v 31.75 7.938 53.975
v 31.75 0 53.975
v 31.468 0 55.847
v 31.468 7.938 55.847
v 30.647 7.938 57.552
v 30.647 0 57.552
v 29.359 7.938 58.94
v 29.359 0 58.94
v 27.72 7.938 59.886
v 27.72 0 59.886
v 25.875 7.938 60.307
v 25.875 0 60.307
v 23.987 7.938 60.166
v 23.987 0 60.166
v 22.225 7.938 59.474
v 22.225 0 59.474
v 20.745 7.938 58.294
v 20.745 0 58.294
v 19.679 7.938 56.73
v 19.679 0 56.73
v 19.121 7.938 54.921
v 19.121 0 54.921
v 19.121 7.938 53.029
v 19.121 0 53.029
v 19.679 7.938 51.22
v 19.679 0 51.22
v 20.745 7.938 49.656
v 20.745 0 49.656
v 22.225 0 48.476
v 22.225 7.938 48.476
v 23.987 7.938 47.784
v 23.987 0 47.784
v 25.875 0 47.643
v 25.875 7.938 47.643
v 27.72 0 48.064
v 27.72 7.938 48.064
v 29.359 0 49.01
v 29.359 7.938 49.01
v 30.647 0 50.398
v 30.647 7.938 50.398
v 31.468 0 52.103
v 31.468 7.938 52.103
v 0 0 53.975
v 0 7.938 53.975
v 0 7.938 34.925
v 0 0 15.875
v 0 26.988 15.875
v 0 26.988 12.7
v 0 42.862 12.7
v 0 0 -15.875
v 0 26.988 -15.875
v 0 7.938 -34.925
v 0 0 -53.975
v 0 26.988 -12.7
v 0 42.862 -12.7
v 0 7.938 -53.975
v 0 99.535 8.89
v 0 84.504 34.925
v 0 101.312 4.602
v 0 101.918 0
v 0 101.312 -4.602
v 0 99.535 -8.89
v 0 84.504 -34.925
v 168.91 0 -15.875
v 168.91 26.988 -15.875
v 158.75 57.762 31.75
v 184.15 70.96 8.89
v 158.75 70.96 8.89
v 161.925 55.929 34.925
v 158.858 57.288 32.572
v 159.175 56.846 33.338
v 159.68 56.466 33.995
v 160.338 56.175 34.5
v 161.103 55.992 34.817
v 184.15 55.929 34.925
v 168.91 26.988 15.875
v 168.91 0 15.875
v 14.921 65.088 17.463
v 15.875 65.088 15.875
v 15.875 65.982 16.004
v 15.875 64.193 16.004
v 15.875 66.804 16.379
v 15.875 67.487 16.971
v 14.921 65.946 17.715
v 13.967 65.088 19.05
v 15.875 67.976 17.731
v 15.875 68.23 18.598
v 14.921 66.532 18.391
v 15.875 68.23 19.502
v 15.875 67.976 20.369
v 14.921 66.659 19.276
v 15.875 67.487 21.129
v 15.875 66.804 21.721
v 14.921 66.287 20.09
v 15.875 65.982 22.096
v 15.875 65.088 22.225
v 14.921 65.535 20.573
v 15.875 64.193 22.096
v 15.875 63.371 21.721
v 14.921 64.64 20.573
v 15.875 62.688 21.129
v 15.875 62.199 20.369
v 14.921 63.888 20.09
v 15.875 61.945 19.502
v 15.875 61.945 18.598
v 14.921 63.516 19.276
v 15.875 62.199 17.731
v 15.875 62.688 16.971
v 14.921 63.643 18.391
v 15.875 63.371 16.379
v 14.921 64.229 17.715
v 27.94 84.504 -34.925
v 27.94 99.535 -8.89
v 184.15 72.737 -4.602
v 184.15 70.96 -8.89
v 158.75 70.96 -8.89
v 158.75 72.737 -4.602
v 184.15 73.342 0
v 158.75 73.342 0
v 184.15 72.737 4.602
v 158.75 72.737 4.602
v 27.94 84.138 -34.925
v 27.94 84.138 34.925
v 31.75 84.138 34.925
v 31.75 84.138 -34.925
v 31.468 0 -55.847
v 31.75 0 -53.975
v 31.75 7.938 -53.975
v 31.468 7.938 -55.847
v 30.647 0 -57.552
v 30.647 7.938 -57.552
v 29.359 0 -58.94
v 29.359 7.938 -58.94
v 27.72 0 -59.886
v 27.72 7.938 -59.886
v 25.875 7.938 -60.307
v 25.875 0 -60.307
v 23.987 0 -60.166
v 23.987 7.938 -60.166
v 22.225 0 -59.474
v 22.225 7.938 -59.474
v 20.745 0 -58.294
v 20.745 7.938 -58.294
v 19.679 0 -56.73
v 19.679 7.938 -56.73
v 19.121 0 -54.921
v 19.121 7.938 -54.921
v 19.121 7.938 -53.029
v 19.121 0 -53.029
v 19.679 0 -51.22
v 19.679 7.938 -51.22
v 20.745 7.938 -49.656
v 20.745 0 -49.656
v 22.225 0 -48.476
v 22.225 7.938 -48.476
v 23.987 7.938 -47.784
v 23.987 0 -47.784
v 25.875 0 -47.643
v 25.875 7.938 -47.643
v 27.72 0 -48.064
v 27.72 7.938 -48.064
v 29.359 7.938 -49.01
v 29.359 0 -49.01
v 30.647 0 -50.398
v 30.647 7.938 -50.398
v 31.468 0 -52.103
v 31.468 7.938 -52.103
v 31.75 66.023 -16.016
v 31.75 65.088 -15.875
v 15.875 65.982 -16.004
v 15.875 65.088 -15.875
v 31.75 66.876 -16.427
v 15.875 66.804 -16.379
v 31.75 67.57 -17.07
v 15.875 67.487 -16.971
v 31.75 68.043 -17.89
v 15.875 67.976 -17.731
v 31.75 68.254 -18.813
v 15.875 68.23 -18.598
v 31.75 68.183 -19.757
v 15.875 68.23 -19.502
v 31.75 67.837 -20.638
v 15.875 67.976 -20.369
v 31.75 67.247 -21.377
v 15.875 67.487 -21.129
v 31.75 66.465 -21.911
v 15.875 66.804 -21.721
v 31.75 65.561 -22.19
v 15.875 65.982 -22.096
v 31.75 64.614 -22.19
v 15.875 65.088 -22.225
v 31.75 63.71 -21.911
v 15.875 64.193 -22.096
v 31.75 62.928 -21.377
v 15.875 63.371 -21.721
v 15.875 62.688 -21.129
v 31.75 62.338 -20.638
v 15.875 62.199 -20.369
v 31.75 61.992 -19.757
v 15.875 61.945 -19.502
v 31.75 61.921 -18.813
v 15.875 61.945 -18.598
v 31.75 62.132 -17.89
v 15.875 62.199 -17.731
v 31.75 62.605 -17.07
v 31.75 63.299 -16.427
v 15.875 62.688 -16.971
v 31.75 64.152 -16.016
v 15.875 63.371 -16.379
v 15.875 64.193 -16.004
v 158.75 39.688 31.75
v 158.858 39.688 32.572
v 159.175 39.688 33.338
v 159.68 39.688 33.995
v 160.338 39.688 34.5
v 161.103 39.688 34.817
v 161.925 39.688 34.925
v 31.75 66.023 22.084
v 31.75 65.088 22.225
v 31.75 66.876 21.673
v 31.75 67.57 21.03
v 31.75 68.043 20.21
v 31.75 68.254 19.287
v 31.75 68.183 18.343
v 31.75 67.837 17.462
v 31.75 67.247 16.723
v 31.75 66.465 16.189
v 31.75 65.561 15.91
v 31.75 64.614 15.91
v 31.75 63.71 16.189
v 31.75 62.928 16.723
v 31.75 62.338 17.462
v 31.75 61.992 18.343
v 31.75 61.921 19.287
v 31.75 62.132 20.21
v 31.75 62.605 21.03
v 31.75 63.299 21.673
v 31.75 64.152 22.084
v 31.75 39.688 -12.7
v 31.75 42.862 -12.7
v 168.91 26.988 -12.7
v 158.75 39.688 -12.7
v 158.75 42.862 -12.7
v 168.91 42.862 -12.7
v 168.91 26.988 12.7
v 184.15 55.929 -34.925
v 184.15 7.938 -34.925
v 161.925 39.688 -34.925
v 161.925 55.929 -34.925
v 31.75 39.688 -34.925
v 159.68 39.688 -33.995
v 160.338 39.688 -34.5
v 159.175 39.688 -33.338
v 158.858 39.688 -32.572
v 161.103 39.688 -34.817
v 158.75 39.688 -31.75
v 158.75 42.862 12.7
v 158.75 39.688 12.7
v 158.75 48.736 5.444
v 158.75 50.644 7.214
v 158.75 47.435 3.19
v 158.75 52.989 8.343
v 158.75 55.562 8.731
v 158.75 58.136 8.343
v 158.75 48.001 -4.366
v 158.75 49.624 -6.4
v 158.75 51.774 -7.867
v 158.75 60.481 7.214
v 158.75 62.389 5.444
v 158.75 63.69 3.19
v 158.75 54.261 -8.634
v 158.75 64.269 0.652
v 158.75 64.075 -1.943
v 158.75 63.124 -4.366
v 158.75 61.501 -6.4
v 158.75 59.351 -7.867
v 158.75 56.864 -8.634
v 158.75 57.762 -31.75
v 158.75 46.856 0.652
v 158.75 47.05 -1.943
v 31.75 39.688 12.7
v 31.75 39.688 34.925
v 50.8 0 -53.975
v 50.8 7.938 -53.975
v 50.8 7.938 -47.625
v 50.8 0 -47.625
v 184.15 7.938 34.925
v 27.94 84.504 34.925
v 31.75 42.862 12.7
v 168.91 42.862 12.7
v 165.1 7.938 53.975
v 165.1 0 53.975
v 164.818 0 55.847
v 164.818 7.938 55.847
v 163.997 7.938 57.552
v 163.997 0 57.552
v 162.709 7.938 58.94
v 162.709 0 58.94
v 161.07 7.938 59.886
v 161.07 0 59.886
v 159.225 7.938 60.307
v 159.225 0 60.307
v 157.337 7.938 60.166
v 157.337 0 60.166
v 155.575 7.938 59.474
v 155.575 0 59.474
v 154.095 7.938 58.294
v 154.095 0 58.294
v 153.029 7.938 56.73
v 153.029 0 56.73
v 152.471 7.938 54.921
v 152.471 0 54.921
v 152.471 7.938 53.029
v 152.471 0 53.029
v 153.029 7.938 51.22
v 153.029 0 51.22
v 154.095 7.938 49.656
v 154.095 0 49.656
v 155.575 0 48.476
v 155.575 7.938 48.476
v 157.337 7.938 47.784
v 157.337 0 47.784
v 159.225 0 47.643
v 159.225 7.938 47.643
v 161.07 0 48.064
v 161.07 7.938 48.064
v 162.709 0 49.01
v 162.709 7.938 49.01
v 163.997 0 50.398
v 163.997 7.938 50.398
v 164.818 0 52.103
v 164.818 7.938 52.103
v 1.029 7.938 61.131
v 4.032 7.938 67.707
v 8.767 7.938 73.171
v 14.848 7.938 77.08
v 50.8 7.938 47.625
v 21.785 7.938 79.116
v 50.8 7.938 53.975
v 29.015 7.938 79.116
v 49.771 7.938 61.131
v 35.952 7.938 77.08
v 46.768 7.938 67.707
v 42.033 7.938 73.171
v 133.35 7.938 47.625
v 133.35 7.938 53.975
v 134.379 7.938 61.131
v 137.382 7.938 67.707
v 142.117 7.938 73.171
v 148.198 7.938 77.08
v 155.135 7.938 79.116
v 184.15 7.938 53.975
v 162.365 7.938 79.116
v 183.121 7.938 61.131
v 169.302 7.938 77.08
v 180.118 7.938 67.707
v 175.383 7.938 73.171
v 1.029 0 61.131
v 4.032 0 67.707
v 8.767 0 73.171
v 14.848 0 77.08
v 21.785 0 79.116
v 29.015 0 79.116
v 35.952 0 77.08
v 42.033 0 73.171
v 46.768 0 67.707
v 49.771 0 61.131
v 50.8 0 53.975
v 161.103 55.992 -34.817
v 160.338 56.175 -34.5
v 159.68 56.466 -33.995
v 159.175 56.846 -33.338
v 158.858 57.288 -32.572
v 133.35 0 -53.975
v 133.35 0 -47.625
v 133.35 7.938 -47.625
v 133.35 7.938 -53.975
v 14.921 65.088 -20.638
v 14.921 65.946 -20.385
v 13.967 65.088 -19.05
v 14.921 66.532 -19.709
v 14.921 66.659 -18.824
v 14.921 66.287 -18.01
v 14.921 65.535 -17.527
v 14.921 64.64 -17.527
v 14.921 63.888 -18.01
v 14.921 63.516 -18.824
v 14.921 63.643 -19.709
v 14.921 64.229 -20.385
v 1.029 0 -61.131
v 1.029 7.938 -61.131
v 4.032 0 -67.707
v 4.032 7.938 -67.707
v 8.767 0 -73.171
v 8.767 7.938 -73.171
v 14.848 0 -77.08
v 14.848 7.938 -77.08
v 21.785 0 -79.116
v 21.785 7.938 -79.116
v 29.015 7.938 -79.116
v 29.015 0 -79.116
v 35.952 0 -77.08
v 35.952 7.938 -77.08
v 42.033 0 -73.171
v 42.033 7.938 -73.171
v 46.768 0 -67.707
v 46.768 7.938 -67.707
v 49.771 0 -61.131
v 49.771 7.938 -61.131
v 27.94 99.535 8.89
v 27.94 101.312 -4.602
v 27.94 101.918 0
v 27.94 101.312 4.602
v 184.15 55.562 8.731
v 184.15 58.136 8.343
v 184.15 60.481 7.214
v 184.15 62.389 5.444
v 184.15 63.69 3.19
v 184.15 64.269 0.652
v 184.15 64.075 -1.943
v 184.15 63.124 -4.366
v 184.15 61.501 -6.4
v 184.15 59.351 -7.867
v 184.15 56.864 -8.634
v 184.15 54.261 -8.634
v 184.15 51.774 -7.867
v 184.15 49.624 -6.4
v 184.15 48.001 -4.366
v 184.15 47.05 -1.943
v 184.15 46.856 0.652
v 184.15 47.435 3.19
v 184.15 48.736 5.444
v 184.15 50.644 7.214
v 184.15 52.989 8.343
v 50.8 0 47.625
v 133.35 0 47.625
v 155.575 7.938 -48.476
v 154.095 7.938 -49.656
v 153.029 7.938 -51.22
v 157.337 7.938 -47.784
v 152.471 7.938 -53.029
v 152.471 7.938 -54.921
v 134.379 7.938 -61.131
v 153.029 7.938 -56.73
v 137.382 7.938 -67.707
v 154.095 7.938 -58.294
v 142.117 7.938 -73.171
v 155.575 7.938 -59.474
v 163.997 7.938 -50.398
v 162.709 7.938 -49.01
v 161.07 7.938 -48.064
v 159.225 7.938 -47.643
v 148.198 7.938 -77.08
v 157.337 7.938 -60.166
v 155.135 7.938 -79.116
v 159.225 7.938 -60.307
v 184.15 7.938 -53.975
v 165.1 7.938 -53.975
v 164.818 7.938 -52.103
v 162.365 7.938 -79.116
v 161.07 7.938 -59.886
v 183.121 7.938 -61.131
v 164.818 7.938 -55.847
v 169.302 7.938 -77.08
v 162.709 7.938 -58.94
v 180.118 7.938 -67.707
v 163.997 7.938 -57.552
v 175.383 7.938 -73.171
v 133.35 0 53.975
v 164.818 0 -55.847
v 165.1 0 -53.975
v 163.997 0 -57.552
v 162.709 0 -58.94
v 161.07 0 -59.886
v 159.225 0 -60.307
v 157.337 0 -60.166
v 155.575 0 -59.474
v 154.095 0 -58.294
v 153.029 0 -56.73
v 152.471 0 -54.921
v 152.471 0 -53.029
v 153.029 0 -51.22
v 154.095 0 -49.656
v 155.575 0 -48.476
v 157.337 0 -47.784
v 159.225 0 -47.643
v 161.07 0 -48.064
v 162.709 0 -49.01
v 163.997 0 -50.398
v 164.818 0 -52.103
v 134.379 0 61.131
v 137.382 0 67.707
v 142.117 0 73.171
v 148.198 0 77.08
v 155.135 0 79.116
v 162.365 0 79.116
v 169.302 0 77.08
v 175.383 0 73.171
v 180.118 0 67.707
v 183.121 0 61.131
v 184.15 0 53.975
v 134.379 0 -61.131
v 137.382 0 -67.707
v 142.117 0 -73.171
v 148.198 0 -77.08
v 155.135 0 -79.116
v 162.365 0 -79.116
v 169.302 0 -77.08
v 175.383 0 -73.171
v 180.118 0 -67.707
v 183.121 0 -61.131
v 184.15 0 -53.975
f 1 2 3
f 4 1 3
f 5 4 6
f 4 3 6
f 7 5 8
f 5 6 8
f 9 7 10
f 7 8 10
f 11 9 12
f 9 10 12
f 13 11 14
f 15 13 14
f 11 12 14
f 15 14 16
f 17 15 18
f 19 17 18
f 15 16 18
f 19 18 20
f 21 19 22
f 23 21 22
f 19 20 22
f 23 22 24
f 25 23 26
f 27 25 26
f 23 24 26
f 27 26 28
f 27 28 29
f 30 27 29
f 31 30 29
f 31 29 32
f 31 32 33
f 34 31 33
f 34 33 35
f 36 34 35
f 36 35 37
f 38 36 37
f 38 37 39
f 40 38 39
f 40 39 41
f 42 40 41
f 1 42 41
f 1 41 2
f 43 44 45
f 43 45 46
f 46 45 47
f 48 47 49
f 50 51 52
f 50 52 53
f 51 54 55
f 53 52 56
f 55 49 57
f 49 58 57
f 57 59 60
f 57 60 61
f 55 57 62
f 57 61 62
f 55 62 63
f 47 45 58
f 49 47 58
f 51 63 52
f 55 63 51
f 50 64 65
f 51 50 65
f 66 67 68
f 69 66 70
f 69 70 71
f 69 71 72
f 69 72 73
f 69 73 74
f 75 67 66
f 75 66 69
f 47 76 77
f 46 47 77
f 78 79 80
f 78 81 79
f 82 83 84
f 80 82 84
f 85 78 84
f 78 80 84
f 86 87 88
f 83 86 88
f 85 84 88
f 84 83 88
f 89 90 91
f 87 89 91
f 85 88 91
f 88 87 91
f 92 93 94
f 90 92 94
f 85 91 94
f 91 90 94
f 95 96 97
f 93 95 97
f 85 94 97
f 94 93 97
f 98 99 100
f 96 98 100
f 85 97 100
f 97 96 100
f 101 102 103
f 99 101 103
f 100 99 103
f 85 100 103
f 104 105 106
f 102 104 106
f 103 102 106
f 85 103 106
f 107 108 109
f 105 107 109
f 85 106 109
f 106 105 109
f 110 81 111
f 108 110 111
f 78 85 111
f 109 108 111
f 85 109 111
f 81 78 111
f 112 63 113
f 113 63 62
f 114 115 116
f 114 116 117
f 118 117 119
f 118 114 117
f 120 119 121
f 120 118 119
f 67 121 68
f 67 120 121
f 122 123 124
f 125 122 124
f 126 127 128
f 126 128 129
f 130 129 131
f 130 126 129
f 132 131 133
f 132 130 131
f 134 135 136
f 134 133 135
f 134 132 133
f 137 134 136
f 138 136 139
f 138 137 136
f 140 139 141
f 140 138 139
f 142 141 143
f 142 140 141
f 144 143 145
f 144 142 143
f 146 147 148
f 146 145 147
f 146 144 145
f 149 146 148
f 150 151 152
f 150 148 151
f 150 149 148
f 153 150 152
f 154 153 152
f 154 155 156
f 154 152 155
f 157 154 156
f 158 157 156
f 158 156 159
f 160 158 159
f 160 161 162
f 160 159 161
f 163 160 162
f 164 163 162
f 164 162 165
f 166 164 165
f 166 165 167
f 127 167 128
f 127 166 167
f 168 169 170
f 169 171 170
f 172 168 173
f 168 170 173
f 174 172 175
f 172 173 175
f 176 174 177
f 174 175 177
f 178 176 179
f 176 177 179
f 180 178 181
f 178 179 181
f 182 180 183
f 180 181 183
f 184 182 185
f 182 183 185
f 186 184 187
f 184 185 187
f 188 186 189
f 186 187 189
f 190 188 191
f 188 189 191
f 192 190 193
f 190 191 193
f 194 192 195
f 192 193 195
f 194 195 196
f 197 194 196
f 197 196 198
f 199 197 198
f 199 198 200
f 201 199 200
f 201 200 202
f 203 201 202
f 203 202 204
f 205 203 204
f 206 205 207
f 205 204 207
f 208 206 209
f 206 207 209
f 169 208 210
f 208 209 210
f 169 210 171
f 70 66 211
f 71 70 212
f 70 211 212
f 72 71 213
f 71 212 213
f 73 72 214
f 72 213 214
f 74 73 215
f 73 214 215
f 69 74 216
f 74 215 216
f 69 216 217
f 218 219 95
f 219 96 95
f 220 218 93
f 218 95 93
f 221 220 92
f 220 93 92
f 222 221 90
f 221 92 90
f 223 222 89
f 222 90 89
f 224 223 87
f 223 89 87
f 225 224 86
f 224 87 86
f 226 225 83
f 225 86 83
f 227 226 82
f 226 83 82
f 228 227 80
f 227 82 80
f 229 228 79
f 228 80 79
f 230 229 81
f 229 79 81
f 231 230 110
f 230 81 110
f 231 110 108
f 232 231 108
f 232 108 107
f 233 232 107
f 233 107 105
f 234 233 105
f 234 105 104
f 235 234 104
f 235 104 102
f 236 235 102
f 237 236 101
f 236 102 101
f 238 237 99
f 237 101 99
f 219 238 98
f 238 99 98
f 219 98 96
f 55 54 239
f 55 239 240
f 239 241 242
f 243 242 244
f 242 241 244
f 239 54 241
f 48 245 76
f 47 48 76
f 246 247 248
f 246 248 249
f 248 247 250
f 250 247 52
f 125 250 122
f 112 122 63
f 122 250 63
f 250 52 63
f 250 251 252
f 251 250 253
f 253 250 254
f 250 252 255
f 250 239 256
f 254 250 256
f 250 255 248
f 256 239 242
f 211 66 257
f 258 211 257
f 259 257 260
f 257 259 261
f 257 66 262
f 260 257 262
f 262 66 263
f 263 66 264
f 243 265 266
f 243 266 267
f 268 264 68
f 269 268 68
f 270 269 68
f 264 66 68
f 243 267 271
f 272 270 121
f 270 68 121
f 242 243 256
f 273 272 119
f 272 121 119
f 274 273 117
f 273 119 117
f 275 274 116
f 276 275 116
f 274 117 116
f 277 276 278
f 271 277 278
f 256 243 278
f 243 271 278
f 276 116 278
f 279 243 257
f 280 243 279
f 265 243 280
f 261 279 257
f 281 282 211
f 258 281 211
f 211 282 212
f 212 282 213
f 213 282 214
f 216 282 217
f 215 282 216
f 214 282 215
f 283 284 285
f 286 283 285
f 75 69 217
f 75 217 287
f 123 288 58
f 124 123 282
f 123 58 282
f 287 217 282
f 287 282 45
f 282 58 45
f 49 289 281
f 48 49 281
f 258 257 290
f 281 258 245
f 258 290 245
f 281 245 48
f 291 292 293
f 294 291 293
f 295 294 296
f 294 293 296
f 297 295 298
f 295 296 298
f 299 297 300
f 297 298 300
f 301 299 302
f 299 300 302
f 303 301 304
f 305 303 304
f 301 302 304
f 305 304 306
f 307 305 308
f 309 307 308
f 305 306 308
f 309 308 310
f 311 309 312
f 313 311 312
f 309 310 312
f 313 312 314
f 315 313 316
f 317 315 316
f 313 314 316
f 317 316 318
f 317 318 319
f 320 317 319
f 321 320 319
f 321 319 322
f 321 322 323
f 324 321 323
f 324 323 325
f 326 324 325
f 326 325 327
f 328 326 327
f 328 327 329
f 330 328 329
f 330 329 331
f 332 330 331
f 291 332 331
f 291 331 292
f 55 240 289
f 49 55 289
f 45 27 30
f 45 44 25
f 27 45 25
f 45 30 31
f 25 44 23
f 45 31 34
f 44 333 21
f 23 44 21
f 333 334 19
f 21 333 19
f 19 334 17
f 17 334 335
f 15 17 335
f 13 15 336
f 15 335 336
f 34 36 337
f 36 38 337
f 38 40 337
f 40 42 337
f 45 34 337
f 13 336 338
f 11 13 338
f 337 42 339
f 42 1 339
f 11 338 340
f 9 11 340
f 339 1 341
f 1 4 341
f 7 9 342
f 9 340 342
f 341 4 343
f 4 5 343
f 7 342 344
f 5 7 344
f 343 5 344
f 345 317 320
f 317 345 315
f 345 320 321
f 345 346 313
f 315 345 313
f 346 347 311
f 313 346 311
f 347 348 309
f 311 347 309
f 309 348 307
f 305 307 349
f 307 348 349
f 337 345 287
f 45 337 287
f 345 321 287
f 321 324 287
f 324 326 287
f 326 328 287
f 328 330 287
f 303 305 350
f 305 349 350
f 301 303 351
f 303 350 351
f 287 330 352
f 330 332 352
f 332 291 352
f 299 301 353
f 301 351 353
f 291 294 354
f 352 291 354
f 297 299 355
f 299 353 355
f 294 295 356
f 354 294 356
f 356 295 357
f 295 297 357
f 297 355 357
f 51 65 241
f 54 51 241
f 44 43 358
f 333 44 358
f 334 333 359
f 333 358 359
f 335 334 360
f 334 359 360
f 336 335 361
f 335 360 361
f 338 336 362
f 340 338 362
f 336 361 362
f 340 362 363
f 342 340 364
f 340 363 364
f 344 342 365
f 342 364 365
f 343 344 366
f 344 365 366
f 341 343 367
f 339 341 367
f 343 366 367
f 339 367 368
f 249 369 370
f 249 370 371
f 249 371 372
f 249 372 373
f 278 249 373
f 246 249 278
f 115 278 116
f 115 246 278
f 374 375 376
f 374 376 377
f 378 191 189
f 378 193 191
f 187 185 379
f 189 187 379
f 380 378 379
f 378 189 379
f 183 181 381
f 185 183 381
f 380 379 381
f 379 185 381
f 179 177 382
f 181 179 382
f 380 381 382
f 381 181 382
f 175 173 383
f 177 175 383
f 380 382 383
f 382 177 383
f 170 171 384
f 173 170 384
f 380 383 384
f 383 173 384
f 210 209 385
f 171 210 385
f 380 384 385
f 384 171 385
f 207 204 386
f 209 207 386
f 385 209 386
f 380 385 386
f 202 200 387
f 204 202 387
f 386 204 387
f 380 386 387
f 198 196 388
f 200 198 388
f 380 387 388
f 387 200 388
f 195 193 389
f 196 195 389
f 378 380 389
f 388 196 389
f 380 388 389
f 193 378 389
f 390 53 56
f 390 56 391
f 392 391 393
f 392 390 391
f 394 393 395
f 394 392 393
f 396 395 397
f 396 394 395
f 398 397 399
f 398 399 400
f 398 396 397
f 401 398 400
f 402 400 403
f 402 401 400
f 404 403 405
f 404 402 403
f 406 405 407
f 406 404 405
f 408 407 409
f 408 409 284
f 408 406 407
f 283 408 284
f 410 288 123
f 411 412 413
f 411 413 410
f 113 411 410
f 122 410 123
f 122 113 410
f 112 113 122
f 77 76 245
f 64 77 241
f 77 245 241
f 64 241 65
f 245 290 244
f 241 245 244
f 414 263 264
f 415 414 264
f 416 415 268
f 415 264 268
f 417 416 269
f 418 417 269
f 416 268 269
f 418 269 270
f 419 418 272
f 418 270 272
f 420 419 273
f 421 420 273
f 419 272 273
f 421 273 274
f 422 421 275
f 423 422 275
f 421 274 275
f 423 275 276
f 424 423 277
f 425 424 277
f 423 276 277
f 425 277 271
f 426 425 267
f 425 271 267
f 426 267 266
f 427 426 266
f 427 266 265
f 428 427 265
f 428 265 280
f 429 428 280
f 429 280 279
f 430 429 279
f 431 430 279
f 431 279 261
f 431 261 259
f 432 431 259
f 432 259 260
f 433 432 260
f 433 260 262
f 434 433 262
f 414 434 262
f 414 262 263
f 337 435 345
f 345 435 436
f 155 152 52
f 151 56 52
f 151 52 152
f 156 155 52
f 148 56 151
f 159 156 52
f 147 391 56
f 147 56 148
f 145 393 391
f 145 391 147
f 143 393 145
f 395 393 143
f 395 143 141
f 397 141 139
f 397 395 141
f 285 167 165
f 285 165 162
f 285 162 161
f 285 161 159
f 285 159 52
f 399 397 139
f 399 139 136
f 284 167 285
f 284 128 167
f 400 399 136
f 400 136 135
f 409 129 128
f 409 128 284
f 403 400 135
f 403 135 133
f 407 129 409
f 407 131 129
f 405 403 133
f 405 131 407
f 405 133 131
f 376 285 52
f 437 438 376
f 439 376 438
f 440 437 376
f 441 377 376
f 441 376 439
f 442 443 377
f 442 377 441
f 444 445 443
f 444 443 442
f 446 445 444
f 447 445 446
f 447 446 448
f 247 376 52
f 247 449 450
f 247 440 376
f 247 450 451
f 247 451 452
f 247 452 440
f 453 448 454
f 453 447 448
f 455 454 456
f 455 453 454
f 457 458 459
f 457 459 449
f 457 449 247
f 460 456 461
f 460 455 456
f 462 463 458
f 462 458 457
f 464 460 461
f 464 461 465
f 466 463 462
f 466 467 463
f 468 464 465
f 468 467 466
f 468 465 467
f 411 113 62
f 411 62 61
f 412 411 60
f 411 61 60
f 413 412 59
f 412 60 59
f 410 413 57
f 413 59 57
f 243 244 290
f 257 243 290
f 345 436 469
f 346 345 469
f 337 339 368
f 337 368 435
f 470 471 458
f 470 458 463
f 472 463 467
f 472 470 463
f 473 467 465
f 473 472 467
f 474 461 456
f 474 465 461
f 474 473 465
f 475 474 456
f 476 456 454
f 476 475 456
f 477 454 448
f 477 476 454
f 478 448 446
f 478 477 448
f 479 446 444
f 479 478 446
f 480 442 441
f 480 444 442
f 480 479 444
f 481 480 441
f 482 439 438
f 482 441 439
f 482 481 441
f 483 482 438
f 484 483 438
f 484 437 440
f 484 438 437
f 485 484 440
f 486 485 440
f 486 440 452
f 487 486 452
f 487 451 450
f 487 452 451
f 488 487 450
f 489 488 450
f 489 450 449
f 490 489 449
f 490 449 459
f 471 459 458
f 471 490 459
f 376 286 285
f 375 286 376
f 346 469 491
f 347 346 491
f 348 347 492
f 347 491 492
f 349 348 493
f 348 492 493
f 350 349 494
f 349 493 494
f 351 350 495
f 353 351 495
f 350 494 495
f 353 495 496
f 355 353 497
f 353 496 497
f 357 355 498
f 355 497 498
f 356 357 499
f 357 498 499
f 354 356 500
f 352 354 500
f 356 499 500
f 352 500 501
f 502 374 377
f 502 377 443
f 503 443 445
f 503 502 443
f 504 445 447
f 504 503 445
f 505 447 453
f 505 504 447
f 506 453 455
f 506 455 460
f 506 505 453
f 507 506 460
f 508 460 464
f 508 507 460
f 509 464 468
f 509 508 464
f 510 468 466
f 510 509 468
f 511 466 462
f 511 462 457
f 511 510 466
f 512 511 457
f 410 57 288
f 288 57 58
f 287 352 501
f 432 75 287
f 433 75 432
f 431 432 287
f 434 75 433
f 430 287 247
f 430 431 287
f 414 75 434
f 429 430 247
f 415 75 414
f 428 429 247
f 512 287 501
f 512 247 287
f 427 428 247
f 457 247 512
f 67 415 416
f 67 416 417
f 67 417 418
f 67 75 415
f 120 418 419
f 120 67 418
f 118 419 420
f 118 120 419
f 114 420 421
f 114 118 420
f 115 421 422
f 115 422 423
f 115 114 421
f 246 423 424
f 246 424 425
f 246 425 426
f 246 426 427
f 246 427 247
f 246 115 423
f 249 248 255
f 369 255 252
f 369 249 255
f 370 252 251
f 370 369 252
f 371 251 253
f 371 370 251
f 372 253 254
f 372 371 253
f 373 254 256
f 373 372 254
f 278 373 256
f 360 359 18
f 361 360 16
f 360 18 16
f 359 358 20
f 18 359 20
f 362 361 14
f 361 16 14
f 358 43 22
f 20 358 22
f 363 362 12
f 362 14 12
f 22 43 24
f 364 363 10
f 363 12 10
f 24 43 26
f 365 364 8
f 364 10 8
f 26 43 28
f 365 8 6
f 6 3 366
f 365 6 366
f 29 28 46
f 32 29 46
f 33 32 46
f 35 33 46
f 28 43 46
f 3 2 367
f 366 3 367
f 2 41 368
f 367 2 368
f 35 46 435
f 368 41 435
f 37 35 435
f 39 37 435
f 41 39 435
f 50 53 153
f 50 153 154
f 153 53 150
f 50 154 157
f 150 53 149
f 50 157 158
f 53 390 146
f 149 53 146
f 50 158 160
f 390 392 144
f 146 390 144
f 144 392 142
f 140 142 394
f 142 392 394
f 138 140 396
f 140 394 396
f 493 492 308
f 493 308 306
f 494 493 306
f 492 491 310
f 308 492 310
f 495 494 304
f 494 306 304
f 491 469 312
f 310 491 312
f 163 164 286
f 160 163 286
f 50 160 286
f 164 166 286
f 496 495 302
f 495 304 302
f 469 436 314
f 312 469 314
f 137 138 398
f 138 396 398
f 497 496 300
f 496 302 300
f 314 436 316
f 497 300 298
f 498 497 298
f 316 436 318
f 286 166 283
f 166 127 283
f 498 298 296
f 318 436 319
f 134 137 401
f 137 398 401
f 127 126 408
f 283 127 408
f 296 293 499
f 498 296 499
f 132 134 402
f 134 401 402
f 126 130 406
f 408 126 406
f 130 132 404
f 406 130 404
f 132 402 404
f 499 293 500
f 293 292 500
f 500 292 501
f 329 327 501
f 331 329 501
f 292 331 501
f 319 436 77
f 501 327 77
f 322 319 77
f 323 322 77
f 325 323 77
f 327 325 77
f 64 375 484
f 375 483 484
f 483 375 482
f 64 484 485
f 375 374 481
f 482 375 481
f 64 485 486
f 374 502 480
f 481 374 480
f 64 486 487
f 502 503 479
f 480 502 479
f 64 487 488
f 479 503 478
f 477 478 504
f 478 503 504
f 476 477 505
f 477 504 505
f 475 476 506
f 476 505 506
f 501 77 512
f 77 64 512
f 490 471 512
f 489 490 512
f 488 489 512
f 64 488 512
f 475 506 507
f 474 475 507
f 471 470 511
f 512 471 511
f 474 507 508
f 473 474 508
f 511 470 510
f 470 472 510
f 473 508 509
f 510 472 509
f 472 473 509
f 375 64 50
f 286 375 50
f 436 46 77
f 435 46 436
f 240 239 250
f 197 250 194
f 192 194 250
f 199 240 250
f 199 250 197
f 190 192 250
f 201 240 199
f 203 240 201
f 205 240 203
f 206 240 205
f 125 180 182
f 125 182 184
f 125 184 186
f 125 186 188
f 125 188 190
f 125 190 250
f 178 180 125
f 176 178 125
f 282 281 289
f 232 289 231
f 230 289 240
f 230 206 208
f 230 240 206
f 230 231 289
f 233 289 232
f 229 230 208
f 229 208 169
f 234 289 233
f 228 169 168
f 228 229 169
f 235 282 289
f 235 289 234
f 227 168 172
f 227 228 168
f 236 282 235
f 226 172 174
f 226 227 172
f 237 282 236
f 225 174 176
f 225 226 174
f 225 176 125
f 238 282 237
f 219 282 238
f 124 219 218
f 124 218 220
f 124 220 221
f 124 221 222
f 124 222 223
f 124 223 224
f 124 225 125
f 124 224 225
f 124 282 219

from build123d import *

# Parameters (mm, degrees)
SKETCH1_W                           = 184.15
SKETCH1_H                           = 39.6875
EXTRUDE1_DEPTH                      = 34.925
SKETCH2_W                           = 31.75
SKETCH2_H                           = 44.45
EXTRUDE2_DEPTH                      = 69.85
EXTRUDE3_DEPTH                      = 25.4
CUT_EXTRUDE1_START                  = -15.24
CUT_EXTRUDE1_DEPTH                  = 169.91
EXTRUDE4_DEPTH                      = 7.9375
EXTRUDE5_DEPTH                      = 7.9375
SKETCH17_W                          = 82.55
SKETCH17_H                          = 12.7
EXTRUDE7_DEPTH                      = 7.9375
F_1_2_0_5_DIAMETER_HOLE1_D          = 12.7
EXTRUDE6_DEPTH                      = 27.94
F_1_4_0_25_DIAMETER_HOLE2_D         = 6.35
F_1_4_0_25_DIAMETER_HOLE2_DEPTH     = 15.875
F_1_4_0_25_DIAMETER_HOLE2_TIP       = 1.907732465
F_11_16_0_6875_DIAMETER_HOLE1_D     = 17.4625
F_11_16_0_6875_DIAMETER_HOLE1_DEPTH = 25.4
FILLET15_R                          = 3.175


with BuildPart() as part:
    # Sketch1 → Extrude1 (new body, symmetric)
    with BuildSketch(Plane.XY):
        with Locations((92.075, 19.84375)):
            Rectangle(SKETCH1_W, SKETCH1_H)
    extrude(amount=EXTRUDE1_DEPTH, both=True)

    # Sketch2 → Extrude2 (add)
    with BuildSketch(Plane.XY.offset(34.925)):
        with Locations((15.875, 61.9125)):
            Rectangle(SKETCH2_W, SKETCH2_H)
    extrude(amount=-EXTRUDE2_DEPTH)

    # Sketch3 → Extrude3 (add)
    with BuildSketch(Plane(origin=(184.15, 0, 0), x_dir=(0, 0, -1), z_dir=(1, 0, 0))):
        with BuildLine():
            Line((-34.925, 39.6875), (34.925, 39.6875))
            Line((34.925, 39.6875), (34.925, 55.929117421))
            Line((34.925, 55.929117421), (8.89, 70.960431679))
            ThreePointArc((8.89, 70.960431679), (0, 73.3425), (-8.89, 70.960431679))
            Line((-8.89, 70.960431679), (-34.925, 55.929117421))
            Line((-34.925, 55.929117421), (-34.925, 39.6875))
        make_face()
    extrude(amount=-EXTRUDE3_DEPTH)

    # Sketch4 → Cut-Extrude1 (cut, through all)
    with BuildSketch(Plane(origin=(184.15, 0, 0), x_dir=(0, 0, -1), z_dir=(1, 0, 0)).offset(CUT_EXTRUDE1_START)):
        Polygon((-15.875, 0), (15.875, 0), (15.875, 26.9875), (12.7, 26.9875), (12.7, 42.8625), (-12.7, 42.8625), (-12.7, 26.9875), (-15.875, 26.9875), align=None)
    extrude(amount=-CUT_EXTRUDE1_DEPTH, mode=Mode.SUBTRACT)

    # Sketch5 → Extrude4 (add)
    with BuildSketch(Plane.XZ):
        with BuildLine():
            Line((50.8, 53.975), (50.8, 34.925))
            Line((50.8, 34.925), (0, 34.925))
            Line((0, 34.925), (0, 53.975))
            ThreePointArc((0, 53.975), (25.4, 79.375), (50.8, 53.975))
        make_face()
    extrude4 = extrude(amount=-EXTRUDE4_DEPTH)

    # Sketch6 → Extrude5 (add)
    with BuildSketch(Plane.XZ):
        with BuildLine():
            Line((184.15, 34.925), (133.35, 34.925))
            Line((133.35, 34.925), (133.35, 53.975))
            ThreePointArc((133.35, 53.975), (158.75, 79.375), (184.15, 53.975))
            Line((184.15, 53.975), (184.15, 34.925))
        make_face()
    extrude5 = extrude(amount=-EXTRUDE5_DEPTH)

    # Sketch17 → Extrude7 (add)
    with BuildSketch(Plane.XZ):
        with Locations((92.075, 41.275)):
            Rectangle(SKETCH17_W, SKETCH17_H)
    extrude7 = extrude(amount=-EXTRUDE7_DEPTH)

    # 1/2 (0.5) Diameter Hole1 (through all)
    with Locations(Plane(origin=(0, 7.9375, 0), x_dir=(-1, 0, 0), z_dir=(0, 1, 0))):
        with Locations((-25.4, 53.975), (-158.75, 53.975)):
            f_1_2_0_5_diameter_hole1 = Hole(F_1_2_0_5_DIAMETER_HOLE1_D / 2)

    # Mirror1: Extrude4, Extrude5, Extrude7, 1/2 (0.5) Diameter Hole1 across plane
    add(extrude4.mirror(Plane.XY))
    add(extrude5.mirror(Plane.XY))
    add(extrude7.mirror(Plane.XY))
    add(f_1_2_0_5_diameter_hole1.mirror(Plane.XY), mode=Mode.SUBTRACT)

    # Sketch16 → Extrude6 (add)
    with BuildSketch(Plane(origin=(0, 0, 0), x_dir=(0, 0, -1), z_dir=(1, 0, 0))):
        with BuildLine():
            Line((-34.925, 84.1375), (34.925, 84.1375))
            Line((34.925, 84.1375), (34.925, 84.504117421))
            Line((34.925, 84.504117421), (8.89, 99.535431679))
            ThreePointArc((8.89, 99.535431679), (0, 101.9175), (-8.89, 99.535431679))
            Line((-8.89, 99.535431679), (-34.925, 84.504117421))
            Line((-34.925, 84.504117421), (-34.925, 84.1375))
        make_face()
    extrude(amount=EXTRUDE6_DEPTH)

    # 1/4 (0.25) Diameter Hole2
    with Locations(Plane(origin=(31.75, 0, 0), x_dir=(0, 0, -1), z_dir=(1, 0, 0))):
        with Locations((-19.05, 65.0875), (19.05, 65.0875)):
            Hole(F_1_4_0_25_DIAMETER_HOLE2_D / 2, depth=F_1_4_0_25_DIAMETER_HOLE2_DEPTH)
            with Locations((0, 0, -(F_1_4_0_25_DIAMETER_HOLE2_DEPTH + F_1_4_0_25_DIAMETER_HOLE2_TIP / 2))):  # 118° drill point
                Cone(0, F_1_4_0_25_DIAMETER_HOLE2_D / 2, F_1_4_0_25_DIAMETER_HOLE2_TIP, mode=Mode.SUBTRACT)

    # 11/16 (0.6875) Diameter Hole1
    with Locations(Plane(origin=(184.15, 0, 0), x_dir=(0, 0, -1), z_dir=(1, 0, 0))):
        with Locations((0, 55.5625)):
            Hole(F_11_16_0_6875_DIAMETER_HOLE1_D / 2, depth=F_11_16_0_6875_DIAMETER_HOLE1_DEPTH)

    # Fillet15
    fillet15_edges = [part.edges().sort_by_distance(p)[0] for p in [
        (158.75, 47.80830871, 34.925),
        (158.75, 47.80830871, -34.925),
    ]]
    fillet(fillet15_edges, radius=FILLET15_R)


solid = part.part
